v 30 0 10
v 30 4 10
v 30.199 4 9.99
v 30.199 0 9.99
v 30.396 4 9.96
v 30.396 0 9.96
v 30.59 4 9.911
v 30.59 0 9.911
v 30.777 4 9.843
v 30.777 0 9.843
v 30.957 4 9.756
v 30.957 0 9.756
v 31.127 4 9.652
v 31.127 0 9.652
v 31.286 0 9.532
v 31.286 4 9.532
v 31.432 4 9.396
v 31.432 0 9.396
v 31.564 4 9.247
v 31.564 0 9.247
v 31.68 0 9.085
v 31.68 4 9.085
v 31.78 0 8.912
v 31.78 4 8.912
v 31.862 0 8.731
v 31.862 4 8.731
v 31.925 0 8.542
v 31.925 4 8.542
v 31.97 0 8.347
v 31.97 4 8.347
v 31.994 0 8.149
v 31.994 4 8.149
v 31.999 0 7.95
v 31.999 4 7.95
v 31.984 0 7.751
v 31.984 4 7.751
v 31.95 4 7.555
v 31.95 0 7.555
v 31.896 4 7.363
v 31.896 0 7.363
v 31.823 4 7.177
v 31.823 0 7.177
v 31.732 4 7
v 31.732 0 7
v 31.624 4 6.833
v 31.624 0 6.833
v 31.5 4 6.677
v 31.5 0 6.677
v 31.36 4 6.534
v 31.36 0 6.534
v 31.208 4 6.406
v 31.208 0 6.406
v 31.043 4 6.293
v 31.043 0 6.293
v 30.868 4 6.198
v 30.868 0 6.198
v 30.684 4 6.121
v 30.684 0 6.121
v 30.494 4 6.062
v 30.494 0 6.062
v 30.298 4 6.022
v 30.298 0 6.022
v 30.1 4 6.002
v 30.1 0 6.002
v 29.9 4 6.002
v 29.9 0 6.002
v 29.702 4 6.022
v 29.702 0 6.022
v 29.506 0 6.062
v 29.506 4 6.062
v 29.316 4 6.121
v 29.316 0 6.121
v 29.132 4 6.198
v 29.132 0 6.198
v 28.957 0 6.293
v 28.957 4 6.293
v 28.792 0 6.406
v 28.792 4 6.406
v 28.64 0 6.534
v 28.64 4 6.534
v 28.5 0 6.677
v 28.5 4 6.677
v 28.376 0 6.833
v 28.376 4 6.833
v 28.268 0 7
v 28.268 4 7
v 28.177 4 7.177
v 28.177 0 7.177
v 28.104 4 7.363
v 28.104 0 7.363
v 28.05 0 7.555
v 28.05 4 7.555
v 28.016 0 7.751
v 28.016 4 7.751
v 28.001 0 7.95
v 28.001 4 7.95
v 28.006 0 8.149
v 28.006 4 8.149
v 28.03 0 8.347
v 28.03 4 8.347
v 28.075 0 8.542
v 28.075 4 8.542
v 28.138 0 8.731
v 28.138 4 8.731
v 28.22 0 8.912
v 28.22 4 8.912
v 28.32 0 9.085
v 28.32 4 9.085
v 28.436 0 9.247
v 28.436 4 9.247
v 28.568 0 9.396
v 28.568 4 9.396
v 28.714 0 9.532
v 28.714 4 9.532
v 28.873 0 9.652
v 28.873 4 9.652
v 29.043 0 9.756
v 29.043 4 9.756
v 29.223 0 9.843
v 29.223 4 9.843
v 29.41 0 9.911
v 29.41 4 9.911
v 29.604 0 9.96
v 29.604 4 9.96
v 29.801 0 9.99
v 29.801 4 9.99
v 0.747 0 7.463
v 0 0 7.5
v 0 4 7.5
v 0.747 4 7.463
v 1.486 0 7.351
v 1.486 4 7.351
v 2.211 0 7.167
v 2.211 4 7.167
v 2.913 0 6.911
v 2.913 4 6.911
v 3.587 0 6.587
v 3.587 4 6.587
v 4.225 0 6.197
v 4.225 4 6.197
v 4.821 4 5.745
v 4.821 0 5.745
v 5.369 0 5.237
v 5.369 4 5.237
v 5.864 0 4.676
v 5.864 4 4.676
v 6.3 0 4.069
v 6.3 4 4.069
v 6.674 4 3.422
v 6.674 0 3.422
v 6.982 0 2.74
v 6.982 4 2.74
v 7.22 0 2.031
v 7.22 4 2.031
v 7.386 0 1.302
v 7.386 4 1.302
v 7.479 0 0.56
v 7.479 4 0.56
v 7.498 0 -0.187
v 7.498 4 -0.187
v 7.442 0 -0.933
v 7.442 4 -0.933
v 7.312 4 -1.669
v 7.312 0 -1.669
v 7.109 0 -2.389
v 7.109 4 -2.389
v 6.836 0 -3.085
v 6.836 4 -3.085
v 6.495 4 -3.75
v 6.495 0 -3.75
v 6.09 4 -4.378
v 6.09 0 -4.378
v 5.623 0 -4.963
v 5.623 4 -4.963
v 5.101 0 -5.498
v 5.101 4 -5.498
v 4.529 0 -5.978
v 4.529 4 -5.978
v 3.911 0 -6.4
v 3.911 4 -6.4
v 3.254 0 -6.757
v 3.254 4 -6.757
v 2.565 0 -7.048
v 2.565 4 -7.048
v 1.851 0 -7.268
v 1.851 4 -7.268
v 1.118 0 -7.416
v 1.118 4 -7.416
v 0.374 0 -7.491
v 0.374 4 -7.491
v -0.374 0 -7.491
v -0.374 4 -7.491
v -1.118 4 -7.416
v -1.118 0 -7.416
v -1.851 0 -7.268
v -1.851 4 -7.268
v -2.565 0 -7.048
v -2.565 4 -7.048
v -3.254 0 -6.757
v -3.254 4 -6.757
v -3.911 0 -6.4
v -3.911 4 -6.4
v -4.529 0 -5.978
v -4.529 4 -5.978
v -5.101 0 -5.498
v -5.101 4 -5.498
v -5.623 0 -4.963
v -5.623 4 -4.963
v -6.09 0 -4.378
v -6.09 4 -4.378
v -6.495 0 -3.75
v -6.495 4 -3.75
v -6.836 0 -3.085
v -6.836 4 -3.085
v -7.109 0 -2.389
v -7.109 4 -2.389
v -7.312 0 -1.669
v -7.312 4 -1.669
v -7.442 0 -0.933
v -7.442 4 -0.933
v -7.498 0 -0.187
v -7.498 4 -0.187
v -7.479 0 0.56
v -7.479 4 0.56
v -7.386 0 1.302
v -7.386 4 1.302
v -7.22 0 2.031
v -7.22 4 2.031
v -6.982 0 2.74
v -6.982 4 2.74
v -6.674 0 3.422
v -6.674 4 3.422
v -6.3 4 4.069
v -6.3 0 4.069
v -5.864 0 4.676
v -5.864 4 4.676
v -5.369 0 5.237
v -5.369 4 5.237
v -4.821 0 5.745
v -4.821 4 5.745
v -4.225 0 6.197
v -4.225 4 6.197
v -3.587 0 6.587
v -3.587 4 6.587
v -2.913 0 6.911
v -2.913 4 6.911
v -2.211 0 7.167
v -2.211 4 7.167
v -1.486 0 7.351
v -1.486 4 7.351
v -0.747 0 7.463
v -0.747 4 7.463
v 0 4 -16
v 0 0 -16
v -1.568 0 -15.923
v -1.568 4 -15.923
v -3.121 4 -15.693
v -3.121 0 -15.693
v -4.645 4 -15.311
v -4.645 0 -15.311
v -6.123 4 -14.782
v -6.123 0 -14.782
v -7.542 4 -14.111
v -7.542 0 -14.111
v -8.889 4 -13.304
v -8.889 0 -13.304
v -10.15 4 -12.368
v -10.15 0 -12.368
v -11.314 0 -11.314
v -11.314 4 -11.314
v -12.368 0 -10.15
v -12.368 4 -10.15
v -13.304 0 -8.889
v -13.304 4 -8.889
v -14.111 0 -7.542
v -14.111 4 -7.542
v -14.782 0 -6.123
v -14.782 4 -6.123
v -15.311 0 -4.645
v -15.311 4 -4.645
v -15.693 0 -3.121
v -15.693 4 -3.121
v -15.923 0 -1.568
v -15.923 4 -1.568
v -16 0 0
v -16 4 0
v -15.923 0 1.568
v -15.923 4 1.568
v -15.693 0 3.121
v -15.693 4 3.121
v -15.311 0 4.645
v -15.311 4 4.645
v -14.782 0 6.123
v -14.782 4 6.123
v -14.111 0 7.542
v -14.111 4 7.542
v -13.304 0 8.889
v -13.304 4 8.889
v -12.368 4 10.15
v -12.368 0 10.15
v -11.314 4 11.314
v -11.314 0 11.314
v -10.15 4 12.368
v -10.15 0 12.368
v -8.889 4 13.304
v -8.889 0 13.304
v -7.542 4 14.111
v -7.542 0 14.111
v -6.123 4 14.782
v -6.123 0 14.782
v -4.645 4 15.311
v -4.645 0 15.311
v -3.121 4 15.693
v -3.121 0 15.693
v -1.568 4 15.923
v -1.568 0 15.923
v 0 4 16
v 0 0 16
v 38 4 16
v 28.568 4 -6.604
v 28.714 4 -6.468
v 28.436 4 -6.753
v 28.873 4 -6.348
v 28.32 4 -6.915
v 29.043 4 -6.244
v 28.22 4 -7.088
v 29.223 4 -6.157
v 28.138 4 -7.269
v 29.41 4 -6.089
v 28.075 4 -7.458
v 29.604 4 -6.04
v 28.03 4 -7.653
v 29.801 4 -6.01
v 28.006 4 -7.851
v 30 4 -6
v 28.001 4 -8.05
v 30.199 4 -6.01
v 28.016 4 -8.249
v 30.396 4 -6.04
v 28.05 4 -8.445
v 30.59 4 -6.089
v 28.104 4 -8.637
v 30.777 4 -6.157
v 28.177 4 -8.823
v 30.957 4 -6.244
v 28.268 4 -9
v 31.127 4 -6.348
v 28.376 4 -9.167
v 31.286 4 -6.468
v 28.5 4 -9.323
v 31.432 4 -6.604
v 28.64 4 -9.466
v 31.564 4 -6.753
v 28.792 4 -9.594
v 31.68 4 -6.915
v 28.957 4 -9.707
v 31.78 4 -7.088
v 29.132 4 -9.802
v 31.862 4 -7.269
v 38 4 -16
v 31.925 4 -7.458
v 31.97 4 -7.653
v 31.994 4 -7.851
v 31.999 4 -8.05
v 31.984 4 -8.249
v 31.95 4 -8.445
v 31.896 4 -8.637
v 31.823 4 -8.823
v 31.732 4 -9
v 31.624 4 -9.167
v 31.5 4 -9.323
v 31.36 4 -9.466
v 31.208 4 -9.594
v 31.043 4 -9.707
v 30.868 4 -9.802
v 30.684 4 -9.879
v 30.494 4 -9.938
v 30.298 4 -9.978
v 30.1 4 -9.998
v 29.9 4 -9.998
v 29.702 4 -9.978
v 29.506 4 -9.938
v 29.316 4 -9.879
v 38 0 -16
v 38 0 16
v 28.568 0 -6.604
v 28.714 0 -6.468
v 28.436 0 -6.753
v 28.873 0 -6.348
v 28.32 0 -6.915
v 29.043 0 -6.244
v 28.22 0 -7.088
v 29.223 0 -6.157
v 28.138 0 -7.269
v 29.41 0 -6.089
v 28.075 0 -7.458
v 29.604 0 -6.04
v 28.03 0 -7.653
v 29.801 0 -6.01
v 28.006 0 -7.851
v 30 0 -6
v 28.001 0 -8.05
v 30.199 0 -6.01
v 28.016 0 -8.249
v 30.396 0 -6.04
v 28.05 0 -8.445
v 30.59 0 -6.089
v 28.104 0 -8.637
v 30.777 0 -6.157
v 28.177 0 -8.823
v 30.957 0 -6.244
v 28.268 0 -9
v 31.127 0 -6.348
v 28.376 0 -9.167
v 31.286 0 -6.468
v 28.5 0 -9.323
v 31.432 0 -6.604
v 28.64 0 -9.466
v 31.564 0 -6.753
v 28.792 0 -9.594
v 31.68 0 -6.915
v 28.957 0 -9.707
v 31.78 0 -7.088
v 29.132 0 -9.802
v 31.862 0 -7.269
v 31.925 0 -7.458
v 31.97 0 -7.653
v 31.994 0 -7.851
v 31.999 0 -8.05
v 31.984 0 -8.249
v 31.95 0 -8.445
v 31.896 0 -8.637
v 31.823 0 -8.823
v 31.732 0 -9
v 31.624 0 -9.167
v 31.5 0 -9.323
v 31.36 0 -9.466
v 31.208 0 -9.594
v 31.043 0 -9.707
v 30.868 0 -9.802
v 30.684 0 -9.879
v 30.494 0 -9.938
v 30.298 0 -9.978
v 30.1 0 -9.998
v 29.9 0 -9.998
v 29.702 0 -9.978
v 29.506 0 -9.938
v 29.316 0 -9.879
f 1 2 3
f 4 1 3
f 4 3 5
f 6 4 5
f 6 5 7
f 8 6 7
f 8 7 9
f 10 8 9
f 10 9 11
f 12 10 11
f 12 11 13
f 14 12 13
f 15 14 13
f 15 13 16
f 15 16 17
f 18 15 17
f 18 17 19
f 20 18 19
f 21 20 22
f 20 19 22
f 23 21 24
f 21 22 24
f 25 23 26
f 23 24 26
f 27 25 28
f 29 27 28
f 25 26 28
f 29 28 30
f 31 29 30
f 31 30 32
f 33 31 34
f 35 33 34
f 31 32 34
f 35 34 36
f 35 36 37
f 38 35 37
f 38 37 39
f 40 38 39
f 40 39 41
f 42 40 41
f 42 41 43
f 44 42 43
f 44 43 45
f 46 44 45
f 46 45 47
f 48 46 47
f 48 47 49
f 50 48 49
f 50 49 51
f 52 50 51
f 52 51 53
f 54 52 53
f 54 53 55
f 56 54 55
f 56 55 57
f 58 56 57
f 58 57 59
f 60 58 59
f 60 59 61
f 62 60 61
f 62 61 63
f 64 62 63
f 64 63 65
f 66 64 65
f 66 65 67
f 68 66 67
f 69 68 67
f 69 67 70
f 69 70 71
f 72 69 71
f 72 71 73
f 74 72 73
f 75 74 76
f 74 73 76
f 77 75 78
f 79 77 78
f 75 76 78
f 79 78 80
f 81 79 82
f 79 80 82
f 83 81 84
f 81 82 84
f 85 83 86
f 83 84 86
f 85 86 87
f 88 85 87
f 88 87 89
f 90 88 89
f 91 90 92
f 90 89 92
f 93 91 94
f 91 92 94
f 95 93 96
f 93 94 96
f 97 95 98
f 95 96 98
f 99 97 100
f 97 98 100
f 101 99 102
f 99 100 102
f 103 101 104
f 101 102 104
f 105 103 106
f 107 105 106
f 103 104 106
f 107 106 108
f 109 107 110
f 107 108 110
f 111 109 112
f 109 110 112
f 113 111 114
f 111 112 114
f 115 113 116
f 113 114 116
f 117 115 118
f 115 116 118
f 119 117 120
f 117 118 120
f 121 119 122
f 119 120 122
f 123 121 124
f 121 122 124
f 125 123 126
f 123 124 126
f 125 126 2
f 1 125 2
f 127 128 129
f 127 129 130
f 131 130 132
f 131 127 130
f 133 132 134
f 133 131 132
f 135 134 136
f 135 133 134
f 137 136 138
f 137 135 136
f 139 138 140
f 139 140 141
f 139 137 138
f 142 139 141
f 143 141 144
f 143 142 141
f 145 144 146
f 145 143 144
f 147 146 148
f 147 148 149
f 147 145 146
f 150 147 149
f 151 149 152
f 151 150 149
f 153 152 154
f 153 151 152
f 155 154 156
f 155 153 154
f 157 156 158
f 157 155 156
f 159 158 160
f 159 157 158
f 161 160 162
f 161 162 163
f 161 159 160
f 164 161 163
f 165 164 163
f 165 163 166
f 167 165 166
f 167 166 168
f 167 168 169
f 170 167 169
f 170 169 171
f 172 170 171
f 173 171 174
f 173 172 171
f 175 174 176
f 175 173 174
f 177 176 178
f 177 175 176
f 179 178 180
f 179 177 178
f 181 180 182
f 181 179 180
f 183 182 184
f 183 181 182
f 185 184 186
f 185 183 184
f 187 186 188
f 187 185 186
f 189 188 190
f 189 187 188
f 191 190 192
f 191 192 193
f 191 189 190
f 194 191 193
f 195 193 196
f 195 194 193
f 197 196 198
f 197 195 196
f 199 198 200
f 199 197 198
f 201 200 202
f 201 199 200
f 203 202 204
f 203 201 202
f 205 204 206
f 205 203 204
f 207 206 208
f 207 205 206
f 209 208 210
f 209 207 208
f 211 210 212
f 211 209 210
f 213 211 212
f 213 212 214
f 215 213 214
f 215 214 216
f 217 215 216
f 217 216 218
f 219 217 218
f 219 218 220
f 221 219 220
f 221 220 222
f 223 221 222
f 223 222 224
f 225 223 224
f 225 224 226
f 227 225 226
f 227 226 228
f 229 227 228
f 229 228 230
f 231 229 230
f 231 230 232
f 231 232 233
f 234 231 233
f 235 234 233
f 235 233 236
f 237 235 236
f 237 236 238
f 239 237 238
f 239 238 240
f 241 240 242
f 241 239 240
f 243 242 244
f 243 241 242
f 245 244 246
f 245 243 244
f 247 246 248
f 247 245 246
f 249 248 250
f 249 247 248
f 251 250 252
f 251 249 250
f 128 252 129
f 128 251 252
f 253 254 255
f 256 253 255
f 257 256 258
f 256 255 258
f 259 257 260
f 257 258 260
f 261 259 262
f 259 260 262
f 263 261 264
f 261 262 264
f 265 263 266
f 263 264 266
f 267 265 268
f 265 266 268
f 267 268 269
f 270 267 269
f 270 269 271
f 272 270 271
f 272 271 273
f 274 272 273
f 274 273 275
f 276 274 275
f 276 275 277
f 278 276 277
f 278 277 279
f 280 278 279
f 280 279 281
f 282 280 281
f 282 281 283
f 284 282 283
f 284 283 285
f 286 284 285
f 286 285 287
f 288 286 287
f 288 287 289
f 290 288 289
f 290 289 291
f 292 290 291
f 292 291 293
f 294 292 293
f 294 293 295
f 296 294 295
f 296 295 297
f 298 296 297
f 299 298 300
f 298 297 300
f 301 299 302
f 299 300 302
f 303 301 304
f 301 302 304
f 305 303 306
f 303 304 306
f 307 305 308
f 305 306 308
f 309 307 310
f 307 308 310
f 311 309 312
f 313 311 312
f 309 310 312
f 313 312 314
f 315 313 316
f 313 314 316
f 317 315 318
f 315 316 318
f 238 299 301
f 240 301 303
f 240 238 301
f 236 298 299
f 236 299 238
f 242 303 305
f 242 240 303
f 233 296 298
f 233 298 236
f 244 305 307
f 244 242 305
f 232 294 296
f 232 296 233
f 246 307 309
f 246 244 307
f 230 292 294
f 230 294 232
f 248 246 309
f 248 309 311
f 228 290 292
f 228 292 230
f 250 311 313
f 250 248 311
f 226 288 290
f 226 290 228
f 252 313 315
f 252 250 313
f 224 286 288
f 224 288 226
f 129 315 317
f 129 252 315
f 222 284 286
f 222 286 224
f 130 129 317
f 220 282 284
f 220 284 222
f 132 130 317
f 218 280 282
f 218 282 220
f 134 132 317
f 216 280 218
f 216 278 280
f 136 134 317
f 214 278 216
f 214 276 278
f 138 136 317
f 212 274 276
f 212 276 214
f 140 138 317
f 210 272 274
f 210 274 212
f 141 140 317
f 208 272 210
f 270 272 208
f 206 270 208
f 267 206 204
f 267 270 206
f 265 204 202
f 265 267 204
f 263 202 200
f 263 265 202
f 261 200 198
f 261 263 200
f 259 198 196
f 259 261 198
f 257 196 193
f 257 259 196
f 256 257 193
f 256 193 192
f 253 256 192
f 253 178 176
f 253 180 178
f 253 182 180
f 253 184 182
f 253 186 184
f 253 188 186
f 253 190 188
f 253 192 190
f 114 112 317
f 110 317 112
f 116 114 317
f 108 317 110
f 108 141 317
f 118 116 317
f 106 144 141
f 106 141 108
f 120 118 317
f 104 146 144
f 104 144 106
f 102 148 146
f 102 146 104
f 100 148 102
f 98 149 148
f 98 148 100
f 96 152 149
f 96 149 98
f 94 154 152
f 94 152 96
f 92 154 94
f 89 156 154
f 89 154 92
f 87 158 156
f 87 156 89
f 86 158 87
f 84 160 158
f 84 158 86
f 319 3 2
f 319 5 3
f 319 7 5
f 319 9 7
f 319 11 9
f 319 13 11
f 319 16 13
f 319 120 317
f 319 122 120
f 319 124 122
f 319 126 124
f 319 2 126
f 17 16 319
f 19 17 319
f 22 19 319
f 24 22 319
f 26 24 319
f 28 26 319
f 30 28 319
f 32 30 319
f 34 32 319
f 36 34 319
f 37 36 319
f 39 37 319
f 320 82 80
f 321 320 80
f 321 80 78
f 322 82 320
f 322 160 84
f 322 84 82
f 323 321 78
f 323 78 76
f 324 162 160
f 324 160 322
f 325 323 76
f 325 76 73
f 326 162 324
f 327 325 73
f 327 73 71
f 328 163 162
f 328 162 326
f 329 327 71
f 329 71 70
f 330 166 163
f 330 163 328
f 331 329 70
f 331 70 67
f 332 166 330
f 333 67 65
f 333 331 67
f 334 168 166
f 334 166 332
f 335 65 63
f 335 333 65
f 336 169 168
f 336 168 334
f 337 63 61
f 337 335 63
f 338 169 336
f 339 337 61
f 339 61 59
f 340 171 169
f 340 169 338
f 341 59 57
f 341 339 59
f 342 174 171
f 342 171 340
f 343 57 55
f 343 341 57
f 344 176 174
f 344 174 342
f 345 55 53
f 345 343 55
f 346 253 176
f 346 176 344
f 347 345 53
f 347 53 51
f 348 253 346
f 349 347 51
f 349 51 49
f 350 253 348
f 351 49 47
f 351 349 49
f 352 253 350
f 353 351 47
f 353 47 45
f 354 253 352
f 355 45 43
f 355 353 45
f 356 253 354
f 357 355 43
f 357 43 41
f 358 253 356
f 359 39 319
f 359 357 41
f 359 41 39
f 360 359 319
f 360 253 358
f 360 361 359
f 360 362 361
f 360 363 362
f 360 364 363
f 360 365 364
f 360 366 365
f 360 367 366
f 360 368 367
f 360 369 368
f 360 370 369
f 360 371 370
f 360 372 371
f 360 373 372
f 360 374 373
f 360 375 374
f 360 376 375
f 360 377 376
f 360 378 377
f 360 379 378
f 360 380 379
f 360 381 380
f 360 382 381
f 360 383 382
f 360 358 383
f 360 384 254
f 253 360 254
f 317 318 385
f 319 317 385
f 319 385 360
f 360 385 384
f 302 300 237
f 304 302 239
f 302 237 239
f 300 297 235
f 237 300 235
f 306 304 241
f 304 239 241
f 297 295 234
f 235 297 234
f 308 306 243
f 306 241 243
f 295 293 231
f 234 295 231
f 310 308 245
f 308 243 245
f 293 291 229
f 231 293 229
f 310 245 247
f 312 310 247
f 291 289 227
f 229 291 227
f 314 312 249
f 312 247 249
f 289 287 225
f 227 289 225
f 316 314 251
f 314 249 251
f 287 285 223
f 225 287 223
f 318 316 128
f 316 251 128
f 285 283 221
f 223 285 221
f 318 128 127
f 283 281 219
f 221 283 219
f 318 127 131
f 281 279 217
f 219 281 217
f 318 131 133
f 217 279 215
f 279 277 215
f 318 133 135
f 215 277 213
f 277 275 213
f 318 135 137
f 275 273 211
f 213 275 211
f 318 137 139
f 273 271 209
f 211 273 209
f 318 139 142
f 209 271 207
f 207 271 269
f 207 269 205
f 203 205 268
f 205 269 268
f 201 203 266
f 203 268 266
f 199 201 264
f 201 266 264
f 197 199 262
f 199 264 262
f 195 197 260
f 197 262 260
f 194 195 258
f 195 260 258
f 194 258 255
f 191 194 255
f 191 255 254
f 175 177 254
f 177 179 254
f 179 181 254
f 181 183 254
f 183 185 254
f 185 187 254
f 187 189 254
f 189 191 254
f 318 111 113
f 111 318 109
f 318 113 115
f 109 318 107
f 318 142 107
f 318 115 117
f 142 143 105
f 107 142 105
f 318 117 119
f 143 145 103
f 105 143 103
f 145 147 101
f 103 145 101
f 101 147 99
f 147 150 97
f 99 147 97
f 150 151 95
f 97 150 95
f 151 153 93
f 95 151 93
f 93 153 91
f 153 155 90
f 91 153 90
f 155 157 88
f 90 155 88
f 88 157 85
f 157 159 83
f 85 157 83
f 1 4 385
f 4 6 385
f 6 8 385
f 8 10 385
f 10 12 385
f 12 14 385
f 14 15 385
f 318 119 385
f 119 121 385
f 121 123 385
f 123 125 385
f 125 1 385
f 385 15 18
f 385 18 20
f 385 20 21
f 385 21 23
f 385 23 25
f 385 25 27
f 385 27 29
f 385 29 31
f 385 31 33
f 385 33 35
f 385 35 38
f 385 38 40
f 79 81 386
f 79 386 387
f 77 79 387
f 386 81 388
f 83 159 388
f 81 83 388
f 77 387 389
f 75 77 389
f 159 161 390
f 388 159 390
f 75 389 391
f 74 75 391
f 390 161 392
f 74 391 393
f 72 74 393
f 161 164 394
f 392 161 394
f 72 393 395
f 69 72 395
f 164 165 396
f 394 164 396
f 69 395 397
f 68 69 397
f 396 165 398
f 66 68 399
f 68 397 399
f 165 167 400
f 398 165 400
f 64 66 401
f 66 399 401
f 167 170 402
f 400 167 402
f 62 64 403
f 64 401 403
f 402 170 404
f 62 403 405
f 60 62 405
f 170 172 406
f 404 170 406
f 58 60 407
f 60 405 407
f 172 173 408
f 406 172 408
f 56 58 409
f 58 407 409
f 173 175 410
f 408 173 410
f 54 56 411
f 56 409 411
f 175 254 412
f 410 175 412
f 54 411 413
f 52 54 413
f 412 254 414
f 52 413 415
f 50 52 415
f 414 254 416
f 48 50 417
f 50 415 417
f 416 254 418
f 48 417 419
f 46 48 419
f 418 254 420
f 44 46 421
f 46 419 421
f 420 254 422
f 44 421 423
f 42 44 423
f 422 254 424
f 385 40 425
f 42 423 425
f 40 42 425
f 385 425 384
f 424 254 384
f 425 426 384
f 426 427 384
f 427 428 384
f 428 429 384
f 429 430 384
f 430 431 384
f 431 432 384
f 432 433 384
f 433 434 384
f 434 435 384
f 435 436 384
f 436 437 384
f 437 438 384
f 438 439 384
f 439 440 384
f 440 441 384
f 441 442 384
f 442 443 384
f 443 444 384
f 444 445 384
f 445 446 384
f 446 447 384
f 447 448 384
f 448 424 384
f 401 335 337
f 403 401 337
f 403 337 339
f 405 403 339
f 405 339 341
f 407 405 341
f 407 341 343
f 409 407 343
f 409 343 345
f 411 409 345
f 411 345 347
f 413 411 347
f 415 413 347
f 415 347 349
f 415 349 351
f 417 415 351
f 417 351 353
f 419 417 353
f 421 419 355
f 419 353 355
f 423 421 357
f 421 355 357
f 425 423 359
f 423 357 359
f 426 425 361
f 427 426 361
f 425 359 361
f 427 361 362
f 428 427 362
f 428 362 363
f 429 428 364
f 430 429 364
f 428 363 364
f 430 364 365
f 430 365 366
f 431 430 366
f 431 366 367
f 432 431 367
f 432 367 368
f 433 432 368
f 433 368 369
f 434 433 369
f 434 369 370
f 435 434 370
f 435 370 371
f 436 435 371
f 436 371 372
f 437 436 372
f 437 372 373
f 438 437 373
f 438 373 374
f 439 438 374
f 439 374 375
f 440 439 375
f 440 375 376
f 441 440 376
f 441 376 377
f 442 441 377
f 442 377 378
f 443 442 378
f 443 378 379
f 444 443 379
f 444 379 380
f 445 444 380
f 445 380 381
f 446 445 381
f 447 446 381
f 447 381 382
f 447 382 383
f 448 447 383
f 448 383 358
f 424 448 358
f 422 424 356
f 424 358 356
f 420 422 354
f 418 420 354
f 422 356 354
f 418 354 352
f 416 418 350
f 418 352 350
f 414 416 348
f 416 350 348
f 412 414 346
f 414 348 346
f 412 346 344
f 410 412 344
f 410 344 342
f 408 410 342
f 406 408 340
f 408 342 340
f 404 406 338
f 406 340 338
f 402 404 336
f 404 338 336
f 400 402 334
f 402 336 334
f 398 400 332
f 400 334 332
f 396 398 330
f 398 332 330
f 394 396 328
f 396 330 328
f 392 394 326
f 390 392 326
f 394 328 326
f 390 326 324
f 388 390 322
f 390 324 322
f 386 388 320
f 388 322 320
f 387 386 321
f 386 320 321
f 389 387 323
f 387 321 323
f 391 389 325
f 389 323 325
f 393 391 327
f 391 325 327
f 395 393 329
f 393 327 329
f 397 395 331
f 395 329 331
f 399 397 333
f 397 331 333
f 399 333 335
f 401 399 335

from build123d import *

# Parameters (mm, degrees)
SKETCH1_R           = 16
SKETCH1_R_2         = 7.5
BOSS_EXTRUDE1_DEPTH = 4
SKETCH2_R           = 2
CUT_EXTRUDE1_DEPTH  = 42.424630354


with BuildPart() as part:
    # Sketch1 → Boss-Extrude1 (new body)
    # profile 1 of 2: a face of its own
    with BuildSketch(Plane(origin=(0, 0, 0), x_dir=(1, 0, 0), z_dir=(0, 1, 0))):
        Circle(SKETCH1_R)
        with Locations(Location((0, 0, 0), (0, 0, 270))):
            Circle(SKETCH1_R_2, mode=Mode.SUBTRACT)
    # profile 2 of 2: a face of its own
    with BuildSketch(Plane(origin=(0, 0, 0), x_dir=(1, 0, 0), z_dir=(0, 1, 0))):
        with BuildLine():
            Line((38, 16), (0, 16))
            ThreePointArc((0, 16), (11.313708499, 11.313708499), (16, 0))
            ThreePointArc((16, 0), (11.313708499, -11.313708499), (0, -16))
            Line((0, -16), (38, -16))
            Line((38, -16), (38, 16))
        make_face()
    extrude(amount=BOSS_EXTRUDE1_DEPTH)

    # Sketch2 → Cut-Extrude1 (cut, through all)
    with BuildSketch(Plane(origin=(0, 4, 0), x_dir=(1, 0, 0), z_dir=(0, 1, 0))):
        with Locations(Location((30, -8, 0), (0, 0, 270))):
            Circle(SKETCH2_R)
        with Locations(Location((30, 8, 0), (0, 0, 270))):
            Circle(SKETCH2_R)
    extrude(amount=-CUT_EXTRUDE1_DEPTH, mode=Mode.SUBTRACT)


solid = part.part
